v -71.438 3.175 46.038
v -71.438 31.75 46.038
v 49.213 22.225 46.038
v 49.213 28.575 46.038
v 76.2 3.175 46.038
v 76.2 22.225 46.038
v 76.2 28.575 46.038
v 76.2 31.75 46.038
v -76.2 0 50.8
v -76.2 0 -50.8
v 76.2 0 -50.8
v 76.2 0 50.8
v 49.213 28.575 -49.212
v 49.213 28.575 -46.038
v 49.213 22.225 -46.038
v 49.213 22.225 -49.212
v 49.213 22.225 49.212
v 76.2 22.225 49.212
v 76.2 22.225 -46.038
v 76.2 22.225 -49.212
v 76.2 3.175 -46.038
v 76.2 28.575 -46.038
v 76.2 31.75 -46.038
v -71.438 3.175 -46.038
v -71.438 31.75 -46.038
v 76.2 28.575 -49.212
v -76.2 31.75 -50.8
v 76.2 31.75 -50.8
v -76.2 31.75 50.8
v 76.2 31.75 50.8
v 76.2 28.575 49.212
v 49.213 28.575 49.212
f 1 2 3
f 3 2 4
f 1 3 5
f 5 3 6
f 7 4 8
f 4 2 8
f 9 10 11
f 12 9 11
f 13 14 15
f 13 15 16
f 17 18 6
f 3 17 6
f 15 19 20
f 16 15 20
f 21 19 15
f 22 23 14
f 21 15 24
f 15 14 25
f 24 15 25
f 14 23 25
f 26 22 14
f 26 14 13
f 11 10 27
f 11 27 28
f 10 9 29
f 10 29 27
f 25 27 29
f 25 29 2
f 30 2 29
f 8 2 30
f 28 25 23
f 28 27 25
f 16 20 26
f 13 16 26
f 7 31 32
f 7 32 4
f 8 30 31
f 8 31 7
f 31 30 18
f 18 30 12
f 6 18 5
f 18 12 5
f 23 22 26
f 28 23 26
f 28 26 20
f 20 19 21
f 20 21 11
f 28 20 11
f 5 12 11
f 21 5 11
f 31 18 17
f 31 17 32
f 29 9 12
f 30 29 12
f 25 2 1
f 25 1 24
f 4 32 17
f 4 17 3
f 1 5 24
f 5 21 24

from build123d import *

# Parameters (mm, degrees)
SKETCH1_W           = 152.4
SKETCH1_H           = 101.6
BOSS_EXTRUDE1_DEPTH = 31.75
CUT_EXTRUDE1_DEPTH  = 28.575
SKETCH3_W           = 4.7625
SKETCH3_H           = 6.35
CUT_EXTRUDE2_DEPTH  = 26.9875


with BuildPart() as part:
    # Sketch1 → Boss-Extrude1 (new body)
    with BuildSketch(Plane(origin=(0, 0, 0), x_dir=(1, 0, 0), z_dir=(0, 1, 0))):
        Rectangle(SKETCH1_W, SKETCH1_H)
    extrude(amount=BOSS_EXTRUDE1_DEPTH)

    # Sketch2 → Cut-Extrude1 (cut)
    with BuildSketch(Plane(origin=(0, 31.75, 0), x_dir=(1, 0, 0), z_dir=(0, 1, 0))):
        Polygon((71.4375, -46.0375), (-71.4375, -46.0375), (-71.4375, 46.0375), (71.4375, 46.0375), (80.9625, 46.0375), (80.9625, -46.0375), align=None)
    extrude(amount=-CUT_EXTRUDE1_DEPTH, mode=Mode.SUBTRACT)

    # Sketch3 → Cut-Extrude2 (cut)
    with BuildSketch(Plane(origin=(76.2, 0, 0), x_dir=(0, 0, -1), z_dir=(1, 0, 0))):
        with Locations((-46.83125, 25.4)):
            Rectangle(SKETCH3_W, SKETCH3_H)
        with Locations((46.83125, 25.4)):
            Rectangle(SKETCH3_W, SKETCH3_H)
    extrude(amount=-CUT_EXTRUDE2_DEPTH, mode=Mode.SUBTRACT)


solid = part.part
